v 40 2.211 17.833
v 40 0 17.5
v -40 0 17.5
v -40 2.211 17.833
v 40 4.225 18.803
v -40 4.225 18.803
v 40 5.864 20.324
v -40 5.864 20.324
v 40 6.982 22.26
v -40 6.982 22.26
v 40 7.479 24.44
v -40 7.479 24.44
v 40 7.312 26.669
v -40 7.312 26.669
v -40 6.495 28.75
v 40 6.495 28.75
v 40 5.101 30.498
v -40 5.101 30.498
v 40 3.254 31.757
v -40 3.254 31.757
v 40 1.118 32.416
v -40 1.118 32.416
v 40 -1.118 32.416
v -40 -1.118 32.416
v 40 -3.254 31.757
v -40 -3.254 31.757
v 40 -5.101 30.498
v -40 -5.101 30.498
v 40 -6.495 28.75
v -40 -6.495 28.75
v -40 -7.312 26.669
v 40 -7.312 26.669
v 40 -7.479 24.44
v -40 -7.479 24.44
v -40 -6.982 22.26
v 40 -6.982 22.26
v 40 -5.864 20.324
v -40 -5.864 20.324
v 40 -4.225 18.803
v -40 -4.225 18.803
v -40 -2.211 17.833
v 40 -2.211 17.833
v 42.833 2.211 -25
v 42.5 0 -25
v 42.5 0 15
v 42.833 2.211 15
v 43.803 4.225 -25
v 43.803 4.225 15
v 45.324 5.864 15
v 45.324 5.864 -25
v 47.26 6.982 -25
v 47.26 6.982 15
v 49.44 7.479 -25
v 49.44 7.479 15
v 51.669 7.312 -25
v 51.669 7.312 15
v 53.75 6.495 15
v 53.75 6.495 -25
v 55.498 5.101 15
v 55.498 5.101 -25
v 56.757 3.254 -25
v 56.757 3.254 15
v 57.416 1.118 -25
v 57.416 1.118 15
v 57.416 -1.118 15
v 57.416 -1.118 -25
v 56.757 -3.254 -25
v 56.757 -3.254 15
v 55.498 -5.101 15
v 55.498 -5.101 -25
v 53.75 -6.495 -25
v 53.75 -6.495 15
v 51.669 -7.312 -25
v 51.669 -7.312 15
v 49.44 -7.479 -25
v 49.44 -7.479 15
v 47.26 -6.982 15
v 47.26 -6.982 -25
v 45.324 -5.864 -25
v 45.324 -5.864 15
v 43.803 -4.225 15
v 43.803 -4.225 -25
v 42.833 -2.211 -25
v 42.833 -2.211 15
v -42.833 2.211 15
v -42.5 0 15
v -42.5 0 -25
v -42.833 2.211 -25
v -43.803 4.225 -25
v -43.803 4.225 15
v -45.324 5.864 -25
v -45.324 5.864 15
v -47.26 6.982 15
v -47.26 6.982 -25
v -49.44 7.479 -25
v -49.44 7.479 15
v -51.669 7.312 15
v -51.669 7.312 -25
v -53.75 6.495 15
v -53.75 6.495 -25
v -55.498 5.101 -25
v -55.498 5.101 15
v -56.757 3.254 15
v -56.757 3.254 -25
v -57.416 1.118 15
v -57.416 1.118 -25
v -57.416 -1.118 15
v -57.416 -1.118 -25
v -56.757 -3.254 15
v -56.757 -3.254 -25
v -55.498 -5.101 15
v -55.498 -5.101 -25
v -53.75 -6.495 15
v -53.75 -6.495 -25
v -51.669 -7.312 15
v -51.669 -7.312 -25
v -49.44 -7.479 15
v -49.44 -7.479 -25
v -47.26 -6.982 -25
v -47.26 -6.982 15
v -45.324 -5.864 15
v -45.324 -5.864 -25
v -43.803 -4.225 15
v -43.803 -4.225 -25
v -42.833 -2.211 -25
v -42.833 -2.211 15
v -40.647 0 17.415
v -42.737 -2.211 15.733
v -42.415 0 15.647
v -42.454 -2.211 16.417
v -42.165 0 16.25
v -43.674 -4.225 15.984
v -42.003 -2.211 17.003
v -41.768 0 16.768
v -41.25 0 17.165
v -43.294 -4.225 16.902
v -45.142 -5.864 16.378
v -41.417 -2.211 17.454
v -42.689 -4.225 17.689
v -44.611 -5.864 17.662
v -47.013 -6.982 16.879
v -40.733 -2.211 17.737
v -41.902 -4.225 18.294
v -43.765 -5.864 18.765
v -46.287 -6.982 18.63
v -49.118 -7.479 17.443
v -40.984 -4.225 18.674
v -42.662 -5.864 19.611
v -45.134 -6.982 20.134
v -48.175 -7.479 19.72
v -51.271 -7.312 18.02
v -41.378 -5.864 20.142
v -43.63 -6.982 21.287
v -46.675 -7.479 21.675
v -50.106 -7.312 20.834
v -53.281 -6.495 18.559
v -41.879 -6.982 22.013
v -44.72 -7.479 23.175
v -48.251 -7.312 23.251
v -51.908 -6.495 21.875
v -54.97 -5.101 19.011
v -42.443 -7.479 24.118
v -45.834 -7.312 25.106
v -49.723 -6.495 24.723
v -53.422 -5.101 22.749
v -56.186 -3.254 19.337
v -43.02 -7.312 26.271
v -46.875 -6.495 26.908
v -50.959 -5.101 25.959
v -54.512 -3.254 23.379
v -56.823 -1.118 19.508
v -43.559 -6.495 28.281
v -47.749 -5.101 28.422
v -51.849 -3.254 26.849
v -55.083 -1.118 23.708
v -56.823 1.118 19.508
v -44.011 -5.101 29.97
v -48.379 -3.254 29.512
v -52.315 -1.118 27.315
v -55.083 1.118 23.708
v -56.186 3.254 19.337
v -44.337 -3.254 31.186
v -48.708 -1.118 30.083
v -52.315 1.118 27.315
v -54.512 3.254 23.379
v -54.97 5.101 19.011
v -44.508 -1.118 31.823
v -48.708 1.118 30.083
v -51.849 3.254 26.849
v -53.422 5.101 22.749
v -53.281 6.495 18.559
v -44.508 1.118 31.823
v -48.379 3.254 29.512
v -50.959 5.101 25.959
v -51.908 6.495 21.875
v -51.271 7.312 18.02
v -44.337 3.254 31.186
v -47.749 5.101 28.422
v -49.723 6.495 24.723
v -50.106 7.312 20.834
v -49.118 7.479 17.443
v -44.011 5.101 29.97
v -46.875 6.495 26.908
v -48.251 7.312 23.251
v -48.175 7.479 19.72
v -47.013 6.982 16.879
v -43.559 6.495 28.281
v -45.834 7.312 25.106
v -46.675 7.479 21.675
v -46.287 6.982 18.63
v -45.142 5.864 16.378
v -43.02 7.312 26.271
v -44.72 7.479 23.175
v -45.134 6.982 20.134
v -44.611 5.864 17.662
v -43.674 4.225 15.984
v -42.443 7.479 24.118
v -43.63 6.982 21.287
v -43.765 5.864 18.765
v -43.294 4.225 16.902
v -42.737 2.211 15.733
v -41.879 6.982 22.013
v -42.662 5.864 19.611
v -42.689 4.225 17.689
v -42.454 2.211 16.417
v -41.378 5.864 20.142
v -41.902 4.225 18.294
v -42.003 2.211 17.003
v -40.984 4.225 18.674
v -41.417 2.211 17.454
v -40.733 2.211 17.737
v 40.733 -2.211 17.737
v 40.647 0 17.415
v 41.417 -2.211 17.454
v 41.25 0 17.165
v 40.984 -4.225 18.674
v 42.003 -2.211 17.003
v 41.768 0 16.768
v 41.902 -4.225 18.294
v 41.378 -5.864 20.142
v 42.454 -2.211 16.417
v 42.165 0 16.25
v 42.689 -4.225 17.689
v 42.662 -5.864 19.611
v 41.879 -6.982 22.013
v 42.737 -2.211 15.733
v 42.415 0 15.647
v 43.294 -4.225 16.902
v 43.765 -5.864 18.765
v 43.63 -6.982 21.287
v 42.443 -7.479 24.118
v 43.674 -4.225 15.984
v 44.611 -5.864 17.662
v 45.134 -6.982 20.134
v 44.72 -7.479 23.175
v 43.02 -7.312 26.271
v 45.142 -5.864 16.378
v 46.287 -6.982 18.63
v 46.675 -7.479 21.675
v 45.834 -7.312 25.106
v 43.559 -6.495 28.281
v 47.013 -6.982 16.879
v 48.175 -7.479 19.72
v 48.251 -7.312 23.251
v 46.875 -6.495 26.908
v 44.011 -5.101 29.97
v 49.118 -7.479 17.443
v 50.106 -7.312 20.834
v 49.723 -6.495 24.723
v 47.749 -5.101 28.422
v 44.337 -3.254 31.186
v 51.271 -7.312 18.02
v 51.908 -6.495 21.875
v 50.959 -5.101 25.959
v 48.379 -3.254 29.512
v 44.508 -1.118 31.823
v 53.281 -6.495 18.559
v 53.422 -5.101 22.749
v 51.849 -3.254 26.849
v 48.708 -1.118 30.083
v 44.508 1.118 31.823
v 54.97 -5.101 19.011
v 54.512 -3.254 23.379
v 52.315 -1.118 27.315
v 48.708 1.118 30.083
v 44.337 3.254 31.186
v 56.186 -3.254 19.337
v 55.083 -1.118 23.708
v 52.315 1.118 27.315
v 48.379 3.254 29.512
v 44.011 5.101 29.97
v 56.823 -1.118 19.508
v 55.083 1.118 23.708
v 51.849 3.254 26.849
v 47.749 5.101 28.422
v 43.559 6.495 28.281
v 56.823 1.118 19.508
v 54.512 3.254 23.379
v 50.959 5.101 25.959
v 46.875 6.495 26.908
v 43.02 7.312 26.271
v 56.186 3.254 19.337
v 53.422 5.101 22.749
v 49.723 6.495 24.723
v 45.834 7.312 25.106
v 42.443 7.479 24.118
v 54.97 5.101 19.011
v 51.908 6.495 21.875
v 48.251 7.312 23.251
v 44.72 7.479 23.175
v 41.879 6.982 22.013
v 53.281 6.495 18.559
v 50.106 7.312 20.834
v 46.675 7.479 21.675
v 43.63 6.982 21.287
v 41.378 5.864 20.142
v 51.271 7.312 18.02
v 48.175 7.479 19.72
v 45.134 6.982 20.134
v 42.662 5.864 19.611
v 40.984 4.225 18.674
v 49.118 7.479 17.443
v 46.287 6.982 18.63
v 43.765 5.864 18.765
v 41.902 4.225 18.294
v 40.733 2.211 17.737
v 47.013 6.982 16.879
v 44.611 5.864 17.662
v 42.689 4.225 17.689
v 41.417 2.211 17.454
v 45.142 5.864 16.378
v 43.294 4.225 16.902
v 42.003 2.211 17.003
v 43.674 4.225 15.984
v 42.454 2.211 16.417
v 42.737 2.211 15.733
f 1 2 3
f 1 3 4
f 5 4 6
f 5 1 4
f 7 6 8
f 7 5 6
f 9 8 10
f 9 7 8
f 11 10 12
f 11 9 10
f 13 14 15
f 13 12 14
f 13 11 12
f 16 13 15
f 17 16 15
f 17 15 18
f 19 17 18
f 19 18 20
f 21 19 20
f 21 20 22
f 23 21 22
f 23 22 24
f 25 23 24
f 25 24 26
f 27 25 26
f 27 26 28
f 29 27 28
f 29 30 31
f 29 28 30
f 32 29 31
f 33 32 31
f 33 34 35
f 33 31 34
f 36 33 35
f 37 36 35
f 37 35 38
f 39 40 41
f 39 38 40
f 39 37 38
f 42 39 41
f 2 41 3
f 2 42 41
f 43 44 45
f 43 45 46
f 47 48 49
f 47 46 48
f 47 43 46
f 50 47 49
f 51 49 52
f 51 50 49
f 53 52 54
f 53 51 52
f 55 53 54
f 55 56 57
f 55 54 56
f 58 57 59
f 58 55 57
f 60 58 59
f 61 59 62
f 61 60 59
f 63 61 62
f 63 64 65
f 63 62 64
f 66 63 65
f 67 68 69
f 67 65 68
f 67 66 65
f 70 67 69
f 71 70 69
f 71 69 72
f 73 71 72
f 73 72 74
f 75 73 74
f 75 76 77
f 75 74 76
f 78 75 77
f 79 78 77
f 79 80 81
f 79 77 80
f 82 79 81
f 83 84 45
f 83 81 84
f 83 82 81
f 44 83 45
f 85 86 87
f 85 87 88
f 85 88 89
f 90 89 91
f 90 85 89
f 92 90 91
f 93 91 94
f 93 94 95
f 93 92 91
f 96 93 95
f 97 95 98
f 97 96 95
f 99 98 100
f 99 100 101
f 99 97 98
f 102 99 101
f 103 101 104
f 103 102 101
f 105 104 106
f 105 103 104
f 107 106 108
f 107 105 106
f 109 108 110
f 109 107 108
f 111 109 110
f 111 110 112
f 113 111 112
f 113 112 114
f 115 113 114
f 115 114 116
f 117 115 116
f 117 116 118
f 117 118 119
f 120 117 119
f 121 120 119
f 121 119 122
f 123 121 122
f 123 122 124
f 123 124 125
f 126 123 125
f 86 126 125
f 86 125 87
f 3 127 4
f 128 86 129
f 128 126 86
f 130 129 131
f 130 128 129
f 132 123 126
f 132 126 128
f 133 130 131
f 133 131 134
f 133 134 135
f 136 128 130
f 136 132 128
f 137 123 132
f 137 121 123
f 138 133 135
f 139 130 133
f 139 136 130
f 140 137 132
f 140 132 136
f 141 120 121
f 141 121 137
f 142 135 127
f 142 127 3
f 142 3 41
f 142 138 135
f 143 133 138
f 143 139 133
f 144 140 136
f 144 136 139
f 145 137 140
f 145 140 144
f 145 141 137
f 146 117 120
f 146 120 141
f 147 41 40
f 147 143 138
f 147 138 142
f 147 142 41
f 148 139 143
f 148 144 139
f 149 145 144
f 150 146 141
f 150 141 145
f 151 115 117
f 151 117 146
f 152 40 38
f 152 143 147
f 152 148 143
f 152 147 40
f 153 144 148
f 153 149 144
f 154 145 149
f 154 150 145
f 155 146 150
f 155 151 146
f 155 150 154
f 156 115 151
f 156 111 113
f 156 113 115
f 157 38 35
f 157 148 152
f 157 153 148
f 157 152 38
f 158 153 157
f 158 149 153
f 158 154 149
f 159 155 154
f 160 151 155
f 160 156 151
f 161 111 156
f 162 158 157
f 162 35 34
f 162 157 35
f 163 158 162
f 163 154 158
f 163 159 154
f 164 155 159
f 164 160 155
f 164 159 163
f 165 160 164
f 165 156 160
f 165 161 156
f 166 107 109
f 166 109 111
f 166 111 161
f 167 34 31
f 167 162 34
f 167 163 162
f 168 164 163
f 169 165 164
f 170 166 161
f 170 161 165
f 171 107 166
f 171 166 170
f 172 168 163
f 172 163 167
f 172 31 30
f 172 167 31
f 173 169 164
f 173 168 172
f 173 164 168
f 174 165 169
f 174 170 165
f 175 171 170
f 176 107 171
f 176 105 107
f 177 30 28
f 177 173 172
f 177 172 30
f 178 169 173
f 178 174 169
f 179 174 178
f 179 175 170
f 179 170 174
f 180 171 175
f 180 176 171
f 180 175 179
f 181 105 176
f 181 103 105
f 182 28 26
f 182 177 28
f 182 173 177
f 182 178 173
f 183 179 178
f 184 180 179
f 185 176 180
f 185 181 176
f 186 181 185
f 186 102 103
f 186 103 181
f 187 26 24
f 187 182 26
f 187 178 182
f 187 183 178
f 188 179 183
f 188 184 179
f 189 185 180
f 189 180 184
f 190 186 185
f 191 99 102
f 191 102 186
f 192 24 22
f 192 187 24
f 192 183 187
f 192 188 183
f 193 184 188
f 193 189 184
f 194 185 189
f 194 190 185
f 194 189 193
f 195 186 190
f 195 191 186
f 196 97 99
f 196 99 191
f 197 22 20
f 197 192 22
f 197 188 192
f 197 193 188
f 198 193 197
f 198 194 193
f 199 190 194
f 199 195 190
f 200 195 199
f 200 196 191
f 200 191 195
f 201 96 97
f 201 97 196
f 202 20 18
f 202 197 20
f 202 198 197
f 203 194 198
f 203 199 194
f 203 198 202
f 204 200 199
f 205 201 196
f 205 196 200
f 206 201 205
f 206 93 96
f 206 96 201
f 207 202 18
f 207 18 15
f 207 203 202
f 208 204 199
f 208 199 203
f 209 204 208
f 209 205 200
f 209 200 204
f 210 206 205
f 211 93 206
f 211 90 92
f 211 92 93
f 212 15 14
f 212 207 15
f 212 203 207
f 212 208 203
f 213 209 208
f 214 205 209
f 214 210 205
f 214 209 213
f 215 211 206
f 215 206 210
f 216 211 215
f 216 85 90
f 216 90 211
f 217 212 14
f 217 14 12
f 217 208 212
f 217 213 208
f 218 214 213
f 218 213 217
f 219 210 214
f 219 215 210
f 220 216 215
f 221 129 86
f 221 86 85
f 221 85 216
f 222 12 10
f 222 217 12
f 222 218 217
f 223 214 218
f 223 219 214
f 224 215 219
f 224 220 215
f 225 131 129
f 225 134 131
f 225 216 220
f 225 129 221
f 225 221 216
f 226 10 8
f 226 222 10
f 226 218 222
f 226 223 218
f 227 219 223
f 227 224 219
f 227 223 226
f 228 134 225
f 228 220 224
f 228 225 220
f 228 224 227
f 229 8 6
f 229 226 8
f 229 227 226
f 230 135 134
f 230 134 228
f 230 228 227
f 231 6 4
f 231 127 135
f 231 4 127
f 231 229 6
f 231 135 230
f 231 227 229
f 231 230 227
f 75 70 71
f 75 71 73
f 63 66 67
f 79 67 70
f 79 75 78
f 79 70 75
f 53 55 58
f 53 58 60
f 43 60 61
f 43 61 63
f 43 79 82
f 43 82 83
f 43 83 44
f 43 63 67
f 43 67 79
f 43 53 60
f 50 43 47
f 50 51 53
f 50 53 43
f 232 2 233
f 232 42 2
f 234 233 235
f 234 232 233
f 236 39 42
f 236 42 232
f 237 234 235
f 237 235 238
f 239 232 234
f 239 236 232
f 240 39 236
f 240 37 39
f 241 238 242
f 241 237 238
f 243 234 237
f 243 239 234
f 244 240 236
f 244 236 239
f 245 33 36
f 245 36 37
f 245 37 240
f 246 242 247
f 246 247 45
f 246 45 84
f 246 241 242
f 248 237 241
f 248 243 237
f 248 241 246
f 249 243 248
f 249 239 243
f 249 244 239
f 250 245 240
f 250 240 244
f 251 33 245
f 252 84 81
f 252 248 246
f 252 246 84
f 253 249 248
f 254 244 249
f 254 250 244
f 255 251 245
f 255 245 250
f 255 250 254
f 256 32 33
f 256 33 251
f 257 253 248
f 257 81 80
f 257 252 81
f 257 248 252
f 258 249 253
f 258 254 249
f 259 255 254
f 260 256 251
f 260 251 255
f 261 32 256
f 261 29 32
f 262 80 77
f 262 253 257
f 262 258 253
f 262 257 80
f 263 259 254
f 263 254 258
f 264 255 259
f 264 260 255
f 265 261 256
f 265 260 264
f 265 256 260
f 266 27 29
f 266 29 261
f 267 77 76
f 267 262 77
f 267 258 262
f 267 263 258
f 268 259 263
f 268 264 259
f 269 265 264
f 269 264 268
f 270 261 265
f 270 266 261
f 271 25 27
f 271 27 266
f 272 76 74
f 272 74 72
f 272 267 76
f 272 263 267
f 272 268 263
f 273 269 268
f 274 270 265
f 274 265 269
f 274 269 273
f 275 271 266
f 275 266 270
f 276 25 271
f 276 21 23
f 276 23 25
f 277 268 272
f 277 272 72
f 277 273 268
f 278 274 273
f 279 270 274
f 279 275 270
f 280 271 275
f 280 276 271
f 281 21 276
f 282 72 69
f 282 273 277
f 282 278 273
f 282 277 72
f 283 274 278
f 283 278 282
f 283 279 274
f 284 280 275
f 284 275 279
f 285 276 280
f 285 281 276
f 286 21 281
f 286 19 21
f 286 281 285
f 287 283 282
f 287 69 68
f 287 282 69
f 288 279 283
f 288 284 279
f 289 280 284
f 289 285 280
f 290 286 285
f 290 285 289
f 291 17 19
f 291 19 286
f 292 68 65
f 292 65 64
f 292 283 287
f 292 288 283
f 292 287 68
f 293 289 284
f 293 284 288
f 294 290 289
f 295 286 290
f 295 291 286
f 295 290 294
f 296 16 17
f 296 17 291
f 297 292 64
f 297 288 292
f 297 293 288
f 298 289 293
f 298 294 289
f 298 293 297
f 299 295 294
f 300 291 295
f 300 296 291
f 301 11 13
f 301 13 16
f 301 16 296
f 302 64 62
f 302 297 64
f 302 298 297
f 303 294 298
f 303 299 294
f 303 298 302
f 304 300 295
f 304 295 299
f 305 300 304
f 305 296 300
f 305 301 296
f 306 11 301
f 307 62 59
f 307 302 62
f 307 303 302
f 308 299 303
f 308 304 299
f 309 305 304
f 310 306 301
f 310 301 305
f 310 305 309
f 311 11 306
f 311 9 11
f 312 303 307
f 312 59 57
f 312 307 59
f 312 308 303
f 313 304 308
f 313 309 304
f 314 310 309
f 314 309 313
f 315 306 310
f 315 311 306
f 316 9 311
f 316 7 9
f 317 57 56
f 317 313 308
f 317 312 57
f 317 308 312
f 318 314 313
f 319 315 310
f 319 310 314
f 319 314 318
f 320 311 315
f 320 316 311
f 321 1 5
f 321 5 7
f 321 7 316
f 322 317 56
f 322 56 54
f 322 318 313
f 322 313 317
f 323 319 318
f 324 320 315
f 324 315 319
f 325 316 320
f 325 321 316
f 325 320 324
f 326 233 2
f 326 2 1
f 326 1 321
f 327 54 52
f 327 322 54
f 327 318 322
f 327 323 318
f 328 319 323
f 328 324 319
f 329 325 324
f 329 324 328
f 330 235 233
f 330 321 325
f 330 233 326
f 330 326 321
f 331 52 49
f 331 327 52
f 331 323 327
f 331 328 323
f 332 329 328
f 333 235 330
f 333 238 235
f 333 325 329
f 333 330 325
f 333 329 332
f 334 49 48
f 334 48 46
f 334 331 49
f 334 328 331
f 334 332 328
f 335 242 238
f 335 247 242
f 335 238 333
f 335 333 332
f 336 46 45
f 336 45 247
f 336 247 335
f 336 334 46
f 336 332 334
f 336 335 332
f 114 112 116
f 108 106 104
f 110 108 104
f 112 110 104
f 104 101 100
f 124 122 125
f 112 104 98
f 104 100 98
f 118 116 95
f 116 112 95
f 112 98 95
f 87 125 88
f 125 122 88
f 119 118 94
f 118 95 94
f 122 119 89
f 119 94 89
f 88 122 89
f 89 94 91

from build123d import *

# Parameters (mm, degrees)
F1_R = 7.5


with BuildPart() as f3:
    # F3: sweep along a path in F2
    with BuildLine(Plane.XZ) as f3_path:
        Line((-50, -25), (-50, 15))
        ThreePointArc((-50, 15), (-47.071068, 22.071068), (-40, 25))
        Line((-40, 25), (40, 25))
        ThreePointArc((40, 25), (47.071068, 22.071068), (50, 15))
        Line((50, 15), (50, -25))
    # F1 (on offset) → F3 (sweep)
    with BuildSketch(Plane.XY.offset(-25)):
        with Locations((-50, 0)):
            Circle(F1_R)
    sweep(path=f3_path.line)


solid = f3.part
